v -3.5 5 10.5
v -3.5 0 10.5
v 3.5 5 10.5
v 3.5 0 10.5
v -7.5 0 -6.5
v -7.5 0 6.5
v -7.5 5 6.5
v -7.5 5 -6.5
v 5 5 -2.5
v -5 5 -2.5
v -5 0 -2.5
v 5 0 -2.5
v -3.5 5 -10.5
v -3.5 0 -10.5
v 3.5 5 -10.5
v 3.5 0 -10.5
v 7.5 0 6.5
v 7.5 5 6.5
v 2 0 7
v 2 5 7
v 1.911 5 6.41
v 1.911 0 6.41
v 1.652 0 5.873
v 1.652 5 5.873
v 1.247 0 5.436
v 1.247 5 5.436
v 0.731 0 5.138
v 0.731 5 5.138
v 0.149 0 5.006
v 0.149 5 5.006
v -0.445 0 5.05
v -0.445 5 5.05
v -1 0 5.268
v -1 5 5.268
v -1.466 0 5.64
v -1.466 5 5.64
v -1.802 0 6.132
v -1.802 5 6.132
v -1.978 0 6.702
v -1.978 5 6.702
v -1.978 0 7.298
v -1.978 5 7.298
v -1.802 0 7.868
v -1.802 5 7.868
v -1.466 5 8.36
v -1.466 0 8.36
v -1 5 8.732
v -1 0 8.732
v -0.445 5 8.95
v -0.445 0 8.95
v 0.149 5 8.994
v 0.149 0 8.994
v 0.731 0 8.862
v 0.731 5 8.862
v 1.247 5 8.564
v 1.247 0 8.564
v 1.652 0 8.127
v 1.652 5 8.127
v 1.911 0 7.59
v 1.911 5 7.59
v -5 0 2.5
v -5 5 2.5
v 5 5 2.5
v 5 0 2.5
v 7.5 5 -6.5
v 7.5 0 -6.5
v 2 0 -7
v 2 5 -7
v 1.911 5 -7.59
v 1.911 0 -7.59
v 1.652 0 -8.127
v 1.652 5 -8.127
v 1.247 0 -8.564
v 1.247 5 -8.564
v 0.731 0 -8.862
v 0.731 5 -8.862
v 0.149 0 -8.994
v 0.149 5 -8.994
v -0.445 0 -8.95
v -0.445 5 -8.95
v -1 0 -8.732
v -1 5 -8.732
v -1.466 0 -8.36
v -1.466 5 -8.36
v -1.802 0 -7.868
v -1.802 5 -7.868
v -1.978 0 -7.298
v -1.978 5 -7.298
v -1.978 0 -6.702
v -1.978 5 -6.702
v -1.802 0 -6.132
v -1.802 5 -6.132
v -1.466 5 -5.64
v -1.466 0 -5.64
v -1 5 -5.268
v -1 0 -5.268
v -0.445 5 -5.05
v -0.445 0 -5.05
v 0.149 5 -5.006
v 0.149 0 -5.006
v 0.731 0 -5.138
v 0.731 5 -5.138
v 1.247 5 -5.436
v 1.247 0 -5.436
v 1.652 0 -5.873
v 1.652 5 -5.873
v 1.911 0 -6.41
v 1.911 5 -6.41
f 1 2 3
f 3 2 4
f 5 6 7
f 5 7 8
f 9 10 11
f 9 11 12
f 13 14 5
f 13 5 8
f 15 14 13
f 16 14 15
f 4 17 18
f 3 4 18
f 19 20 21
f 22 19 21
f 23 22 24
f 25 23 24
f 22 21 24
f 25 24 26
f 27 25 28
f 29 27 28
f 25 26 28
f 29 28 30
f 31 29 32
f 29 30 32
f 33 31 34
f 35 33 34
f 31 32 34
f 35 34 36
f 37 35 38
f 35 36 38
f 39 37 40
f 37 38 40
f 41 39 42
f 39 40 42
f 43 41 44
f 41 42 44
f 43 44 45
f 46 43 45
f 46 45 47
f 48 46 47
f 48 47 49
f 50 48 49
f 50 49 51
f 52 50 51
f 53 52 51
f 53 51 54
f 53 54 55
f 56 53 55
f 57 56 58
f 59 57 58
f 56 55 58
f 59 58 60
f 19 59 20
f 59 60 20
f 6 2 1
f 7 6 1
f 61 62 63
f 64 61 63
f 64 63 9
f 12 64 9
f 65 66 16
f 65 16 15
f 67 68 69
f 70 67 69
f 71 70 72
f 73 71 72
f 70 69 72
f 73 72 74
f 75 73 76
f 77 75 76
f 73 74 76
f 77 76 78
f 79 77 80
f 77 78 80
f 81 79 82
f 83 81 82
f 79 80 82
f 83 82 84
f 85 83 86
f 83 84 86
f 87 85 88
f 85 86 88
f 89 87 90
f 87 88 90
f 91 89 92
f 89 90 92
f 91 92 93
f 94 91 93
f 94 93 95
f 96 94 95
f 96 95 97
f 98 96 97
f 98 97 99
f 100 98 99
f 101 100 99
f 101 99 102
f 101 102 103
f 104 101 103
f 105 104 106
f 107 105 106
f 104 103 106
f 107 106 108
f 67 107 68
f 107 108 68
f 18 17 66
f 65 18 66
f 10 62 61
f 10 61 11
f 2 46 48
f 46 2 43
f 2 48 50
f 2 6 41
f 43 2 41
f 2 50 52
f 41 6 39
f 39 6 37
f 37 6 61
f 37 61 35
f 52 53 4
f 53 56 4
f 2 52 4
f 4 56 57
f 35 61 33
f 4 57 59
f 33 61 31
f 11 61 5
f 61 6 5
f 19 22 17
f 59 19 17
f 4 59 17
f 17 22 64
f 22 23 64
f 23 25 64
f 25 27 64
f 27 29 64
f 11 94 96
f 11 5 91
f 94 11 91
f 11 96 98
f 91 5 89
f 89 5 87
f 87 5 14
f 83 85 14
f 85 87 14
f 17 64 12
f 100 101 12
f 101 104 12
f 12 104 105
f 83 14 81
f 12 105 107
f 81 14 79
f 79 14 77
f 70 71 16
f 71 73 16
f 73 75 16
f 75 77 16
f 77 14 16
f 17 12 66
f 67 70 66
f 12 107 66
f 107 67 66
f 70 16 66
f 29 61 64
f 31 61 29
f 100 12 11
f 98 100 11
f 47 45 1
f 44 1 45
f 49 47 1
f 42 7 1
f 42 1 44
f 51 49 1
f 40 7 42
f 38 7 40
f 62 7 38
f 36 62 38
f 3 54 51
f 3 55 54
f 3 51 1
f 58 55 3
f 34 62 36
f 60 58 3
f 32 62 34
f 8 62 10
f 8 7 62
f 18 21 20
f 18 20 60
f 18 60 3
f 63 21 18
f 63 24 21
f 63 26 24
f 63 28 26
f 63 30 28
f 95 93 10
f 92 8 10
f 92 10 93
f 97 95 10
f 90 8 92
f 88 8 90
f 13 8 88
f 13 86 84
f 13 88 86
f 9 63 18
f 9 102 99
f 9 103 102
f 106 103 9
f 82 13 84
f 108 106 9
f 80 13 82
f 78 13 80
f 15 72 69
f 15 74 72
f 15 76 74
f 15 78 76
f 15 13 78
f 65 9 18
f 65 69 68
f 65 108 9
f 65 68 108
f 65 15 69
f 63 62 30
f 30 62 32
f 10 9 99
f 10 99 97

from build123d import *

# Parameters (mm, degrees)
SKETCH1_W           = 15
SKETCH1_H           = 21
BOSS_EXTRUDE1_DEPTH = 5
SKETCH2_R           = 2
SKETCH2_W           = 10
SKETCH2_H           = 5
CUT_EXTRUDE1_DEPTH  = 5
CHAMFER1_SIZE       = 4


with BuildPart() as part:
    # Sketch1 → Boss-Extrude1 (new body)
    with BuildSketch(Plane(origin=(0, 0, 0), x_dir=(1, 0, 0), z_dir=(0, 1, 0))):
        Rectangle(SKETCH1_W, SKETCH1_H)
    extrude(amount=BOSS_EXTRUDE1_DEPTH)

    # Sketch2 → Cut-Extrude1 (cut)
    with BuildSketch(Plane(origin=(0, 5, 0), x_dir=(1, 0, 0), z_dir=(0, 1, 0))):
        with Locations((0, 7)):
            Circle(SKETCH2_R)
        with Locations((0, -7)):
            Circle(SKETCH2_R)
        Rectangle(SKETCH2_W, SKETCH2_H)
    extrude(amount=-CUT_EXTRUDE1_DEPTH, mode=Mode.SUBTRACT)

    # Chamfer1
    chamfer1_edges = [part.edges().sort_by_distance(p)[0] for p in [
        (7.5, 2.5, 10.5),
        (-7.5, 2.5, 10.5),
        (-7.5, 2.5, -10.5),
        (7.5, 2.5, -10.5),
    ]]
    chamfer(chamfer1_edges, length=CHAMFER1_SIZE)


solid = part.part
